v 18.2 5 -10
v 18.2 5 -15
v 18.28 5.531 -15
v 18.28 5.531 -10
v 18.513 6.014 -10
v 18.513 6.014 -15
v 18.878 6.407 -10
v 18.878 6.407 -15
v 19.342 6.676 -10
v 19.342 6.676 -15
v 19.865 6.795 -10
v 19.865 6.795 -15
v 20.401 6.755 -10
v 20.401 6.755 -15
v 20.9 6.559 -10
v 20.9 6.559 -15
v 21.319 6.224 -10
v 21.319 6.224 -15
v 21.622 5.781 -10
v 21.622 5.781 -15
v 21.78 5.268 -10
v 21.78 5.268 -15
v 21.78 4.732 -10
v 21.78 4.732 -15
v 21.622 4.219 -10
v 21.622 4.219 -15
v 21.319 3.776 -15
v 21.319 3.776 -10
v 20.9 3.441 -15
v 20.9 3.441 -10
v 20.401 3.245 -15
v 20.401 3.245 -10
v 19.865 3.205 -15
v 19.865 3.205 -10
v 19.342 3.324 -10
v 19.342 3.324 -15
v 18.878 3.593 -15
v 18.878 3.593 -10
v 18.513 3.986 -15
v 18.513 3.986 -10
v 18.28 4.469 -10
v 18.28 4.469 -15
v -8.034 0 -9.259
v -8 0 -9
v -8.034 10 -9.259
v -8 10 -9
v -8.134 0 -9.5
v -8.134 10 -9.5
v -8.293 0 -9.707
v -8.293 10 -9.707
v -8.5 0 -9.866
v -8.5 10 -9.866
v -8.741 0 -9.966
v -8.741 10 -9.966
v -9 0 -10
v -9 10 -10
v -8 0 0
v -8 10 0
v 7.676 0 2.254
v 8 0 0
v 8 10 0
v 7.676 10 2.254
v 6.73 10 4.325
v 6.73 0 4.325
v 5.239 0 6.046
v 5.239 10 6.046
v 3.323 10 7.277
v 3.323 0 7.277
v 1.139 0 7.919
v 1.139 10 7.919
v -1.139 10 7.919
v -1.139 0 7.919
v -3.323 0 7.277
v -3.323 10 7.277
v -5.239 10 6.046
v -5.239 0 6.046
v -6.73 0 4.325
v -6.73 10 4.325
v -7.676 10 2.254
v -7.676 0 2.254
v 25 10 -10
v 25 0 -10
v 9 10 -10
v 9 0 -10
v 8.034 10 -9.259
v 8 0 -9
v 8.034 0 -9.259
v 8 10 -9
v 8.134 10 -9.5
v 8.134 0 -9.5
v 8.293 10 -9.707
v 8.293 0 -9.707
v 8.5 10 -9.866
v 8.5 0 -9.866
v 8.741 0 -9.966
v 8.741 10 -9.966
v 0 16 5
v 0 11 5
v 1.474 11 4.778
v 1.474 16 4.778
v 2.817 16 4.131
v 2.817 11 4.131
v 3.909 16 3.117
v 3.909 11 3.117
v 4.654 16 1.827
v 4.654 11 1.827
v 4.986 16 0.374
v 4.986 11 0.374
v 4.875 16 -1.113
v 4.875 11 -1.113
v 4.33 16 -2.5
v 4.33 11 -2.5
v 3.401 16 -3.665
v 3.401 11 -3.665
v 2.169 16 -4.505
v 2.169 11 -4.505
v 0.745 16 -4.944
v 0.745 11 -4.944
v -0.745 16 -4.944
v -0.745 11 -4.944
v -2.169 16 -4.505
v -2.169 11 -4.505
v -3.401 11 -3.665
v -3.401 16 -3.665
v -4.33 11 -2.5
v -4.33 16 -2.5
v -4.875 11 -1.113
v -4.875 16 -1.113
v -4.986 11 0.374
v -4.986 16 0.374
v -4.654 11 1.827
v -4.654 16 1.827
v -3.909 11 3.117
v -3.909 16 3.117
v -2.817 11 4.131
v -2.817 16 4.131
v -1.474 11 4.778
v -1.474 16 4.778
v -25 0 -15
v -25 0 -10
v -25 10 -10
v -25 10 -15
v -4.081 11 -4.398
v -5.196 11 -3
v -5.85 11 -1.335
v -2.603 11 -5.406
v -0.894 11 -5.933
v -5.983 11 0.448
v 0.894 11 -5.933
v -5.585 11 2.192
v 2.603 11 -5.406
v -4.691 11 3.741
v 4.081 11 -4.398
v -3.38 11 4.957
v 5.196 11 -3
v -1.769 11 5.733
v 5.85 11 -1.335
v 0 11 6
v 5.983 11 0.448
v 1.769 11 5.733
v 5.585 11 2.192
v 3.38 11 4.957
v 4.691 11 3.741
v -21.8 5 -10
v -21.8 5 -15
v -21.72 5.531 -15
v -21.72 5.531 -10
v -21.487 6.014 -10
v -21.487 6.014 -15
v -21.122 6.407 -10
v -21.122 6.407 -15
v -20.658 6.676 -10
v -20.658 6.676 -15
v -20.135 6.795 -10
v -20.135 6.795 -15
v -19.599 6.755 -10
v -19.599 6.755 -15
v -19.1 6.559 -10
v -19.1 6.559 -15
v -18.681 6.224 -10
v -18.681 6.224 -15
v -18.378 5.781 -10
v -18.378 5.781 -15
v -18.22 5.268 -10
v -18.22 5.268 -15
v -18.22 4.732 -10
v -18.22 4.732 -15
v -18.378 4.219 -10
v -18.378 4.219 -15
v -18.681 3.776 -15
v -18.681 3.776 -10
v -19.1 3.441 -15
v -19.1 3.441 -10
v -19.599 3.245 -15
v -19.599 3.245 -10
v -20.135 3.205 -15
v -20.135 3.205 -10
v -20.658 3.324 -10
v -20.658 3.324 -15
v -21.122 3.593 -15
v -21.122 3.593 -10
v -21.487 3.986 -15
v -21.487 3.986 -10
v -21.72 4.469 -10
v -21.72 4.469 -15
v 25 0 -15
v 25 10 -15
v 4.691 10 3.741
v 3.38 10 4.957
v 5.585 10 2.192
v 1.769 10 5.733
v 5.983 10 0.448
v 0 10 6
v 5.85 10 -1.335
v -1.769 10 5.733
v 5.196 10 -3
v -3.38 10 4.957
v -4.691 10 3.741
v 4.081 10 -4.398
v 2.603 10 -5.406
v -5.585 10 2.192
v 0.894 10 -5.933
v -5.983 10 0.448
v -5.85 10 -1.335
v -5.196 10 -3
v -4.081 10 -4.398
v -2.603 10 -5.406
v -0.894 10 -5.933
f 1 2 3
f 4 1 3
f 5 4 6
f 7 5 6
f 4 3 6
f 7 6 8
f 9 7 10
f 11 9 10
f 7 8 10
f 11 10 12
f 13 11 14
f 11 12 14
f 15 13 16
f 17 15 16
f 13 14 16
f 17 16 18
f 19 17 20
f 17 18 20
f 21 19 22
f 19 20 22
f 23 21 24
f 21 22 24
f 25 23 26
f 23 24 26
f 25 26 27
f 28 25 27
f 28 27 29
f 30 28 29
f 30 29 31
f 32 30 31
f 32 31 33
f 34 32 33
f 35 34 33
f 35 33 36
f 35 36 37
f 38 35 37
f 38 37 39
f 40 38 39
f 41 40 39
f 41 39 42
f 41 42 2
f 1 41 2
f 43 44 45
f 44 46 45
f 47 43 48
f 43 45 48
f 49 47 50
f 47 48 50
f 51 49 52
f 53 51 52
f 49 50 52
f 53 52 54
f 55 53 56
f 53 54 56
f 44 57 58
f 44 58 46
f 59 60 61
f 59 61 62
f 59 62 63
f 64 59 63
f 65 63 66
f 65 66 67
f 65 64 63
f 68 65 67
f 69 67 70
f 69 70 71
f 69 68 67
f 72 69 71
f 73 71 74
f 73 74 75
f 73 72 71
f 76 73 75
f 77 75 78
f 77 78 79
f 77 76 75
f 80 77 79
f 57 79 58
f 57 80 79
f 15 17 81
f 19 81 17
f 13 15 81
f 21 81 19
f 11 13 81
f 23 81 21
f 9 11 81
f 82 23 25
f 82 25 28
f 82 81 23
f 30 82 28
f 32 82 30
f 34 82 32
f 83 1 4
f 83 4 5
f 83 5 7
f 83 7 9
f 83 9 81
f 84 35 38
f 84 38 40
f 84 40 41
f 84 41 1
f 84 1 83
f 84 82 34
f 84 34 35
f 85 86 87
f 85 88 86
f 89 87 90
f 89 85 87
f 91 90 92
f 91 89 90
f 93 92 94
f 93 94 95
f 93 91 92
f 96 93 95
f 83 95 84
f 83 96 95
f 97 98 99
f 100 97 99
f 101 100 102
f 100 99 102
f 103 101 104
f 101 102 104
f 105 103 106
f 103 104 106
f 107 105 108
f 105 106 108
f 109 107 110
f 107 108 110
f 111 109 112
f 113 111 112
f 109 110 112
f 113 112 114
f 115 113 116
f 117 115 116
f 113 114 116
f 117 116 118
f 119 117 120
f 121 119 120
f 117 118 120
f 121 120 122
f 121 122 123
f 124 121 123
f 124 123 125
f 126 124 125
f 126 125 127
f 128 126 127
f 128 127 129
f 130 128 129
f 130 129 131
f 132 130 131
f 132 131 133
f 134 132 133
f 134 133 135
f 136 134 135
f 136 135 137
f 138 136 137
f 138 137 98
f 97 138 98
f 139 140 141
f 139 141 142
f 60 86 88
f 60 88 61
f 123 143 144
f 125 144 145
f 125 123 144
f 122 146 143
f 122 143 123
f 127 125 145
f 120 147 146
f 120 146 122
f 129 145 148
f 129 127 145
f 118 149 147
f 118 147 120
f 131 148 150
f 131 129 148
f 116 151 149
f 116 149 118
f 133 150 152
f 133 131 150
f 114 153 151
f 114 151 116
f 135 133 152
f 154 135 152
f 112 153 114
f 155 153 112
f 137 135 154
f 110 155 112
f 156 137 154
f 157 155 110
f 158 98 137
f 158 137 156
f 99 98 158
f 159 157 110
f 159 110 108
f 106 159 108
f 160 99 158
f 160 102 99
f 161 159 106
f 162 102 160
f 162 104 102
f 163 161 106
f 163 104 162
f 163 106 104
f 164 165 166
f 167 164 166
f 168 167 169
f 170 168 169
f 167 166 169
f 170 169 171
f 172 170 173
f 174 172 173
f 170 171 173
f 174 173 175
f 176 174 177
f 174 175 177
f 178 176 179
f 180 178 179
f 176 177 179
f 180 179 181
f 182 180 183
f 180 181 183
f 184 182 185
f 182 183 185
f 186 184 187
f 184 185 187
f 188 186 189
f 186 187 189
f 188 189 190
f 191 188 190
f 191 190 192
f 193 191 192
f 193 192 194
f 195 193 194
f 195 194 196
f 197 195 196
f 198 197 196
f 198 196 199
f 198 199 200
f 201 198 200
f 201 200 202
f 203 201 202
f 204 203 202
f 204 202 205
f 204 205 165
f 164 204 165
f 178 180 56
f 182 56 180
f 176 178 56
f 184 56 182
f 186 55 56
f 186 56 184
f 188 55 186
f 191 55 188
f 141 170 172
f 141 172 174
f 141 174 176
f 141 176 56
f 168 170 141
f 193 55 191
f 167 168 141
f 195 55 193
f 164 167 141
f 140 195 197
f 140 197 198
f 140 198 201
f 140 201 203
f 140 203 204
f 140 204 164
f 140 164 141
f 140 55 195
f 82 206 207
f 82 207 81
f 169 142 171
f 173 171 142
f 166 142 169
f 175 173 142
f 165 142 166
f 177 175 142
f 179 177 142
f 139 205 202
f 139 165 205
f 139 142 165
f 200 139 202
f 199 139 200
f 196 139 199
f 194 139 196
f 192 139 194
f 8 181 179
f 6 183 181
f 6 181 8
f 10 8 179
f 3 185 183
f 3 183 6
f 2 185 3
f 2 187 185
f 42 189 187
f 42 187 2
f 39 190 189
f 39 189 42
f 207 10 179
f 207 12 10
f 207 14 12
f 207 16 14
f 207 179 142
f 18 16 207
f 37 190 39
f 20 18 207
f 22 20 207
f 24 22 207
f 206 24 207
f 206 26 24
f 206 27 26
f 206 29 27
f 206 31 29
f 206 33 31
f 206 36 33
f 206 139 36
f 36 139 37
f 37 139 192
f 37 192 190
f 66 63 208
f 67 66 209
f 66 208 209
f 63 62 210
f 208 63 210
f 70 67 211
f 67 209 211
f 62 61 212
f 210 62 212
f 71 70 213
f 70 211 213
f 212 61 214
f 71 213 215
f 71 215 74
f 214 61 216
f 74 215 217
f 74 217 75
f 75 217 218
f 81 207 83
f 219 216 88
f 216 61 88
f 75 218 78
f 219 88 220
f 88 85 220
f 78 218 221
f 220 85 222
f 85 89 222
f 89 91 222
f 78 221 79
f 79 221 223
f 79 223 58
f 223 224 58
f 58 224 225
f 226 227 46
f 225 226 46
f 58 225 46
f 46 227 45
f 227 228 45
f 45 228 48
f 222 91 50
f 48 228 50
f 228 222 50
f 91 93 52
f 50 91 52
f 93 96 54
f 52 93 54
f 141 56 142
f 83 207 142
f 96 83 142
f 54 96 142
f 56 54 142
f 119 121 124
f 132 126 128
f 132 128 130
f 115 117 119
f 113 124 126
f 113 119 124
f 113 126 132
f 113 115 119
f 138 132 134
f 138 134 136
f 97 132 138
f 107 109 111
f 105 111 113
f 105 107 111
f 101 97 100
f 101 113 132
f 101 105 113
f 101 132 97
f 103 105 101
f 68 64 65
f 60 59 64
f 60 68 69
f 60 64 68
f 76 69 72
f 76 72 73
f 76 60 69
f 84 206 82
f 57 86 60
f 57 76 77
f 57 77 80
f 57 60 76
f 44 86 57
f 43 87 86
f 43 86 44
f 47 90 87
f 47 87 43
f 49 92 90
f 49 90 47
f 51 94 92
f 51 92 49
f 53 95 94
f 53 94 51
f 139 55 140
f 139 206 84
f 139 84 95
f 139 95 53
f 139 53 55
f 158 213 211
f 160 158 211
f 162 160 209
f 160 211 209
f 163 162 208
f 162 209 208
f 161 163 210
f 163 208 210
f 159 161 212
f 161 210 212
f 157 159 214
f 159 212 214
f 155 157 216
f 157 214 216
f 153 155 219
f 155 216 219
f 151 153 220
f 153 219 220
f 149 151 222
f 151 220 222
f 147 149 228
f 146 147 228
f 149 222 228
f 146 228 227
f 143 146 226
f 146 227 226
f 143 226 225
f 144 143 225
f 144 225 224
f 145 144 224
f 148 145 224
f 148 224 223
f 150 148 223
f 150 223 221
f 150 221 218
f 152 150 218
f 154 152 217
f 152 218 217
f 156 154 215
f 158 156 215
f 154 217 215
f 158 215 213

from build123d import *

# Parameters (mm, degrees)
EXTRUDE_1_DEPTH     = 10
SKETCH_2_R          = 5
EXTRUDE_2_DEPTH     = 6
SKETCH_3_R          = 6
EXTRUDE_3_DEPTH     = 1
SKETCH_4_R          = 1.8
CUT_EXTRUDE_1_DEPTH = 38.549966711
FILLET_1_R          = 1


with BuildPart() as part:
    # ｽｹｯﾁ1 → ﾎﾞｽ - 押し出し1 (new body)
    with BuildSketch(Plane(origin=(0, 0, 0), x_dir=(1, 0, 0), z_dir=(0, 1, 0))):
        with BuildLine():
            Line((-8, 0), (-8, 10))
            Line((-8, 10), (-25, 10))
            Line((-25, 10), (-25, 15))
            Line((-25, 15), (25, 15))
            Line((25, 15), (25, 10))
            Line((25, 10), (8, 10))
            Line((8, 10), (8, 0))
            ThreePointArc((8, 0), (0, -8), (-8, 0))
        make_face()
    extrude(amount=EXTRUDE_1_DEPTH)

    # ｽｹｯﾁ2 → ﾎﾞｽ - 押し出し2 (add)
    with BuildSketch(Plane(origin=(0, 10, 0), x_dir=(1, 0, 0), z_dir=(0, 1, 0))):
        with Locations(Location((0, 0, 0), (0, 0, 270))):
            Circle(SKETCH_2_R)
    extrude(amount=EXTRUDE_2_DEPTH)

    # ｽｹｯﾁ3 → ﾎﾞｽ - 押し出し3 (add)
    with BuildSketch(Plane(origin=(0, 10, 0), x_dir=(1, 0, 0), z_dir=(0, 1, 0))):
        with Locations(Location((0, 0, 0), (0, 0, 270))):
            Circle(SKETCH_3_R)
    extrude(amount=EXTRUDE_3_DEPTH)

    # ｽｹｯﾁ4 → ｶｯﾄ - 押し出し1 (cut, through all)
    with BuildSketch(Plane(origin=(0, 0, -15), x_dir=(-1, 0, 0), z_dir=(0, 0, -1))):
        with Locations((20, 5)):
            Circle(SKETCH_4_R)
        with Locations((-20, 5)):
            Circle(SKETCH_4_R)
    extrude(amount=-CUT_EXTRUDE_1_DEPTH, mode=Mode.SUBTRACT)

    # ﾌｨﾚｯﾄ1
    fillet_1_edges = [part.edges().sort_by_distance(p)[0] for p in [
        (-8, 5, -10),
        (8, 5, -10),
    ]]
    fillet(fillet_1_edges, radius=FILLET_1_R)


solid = part.part
